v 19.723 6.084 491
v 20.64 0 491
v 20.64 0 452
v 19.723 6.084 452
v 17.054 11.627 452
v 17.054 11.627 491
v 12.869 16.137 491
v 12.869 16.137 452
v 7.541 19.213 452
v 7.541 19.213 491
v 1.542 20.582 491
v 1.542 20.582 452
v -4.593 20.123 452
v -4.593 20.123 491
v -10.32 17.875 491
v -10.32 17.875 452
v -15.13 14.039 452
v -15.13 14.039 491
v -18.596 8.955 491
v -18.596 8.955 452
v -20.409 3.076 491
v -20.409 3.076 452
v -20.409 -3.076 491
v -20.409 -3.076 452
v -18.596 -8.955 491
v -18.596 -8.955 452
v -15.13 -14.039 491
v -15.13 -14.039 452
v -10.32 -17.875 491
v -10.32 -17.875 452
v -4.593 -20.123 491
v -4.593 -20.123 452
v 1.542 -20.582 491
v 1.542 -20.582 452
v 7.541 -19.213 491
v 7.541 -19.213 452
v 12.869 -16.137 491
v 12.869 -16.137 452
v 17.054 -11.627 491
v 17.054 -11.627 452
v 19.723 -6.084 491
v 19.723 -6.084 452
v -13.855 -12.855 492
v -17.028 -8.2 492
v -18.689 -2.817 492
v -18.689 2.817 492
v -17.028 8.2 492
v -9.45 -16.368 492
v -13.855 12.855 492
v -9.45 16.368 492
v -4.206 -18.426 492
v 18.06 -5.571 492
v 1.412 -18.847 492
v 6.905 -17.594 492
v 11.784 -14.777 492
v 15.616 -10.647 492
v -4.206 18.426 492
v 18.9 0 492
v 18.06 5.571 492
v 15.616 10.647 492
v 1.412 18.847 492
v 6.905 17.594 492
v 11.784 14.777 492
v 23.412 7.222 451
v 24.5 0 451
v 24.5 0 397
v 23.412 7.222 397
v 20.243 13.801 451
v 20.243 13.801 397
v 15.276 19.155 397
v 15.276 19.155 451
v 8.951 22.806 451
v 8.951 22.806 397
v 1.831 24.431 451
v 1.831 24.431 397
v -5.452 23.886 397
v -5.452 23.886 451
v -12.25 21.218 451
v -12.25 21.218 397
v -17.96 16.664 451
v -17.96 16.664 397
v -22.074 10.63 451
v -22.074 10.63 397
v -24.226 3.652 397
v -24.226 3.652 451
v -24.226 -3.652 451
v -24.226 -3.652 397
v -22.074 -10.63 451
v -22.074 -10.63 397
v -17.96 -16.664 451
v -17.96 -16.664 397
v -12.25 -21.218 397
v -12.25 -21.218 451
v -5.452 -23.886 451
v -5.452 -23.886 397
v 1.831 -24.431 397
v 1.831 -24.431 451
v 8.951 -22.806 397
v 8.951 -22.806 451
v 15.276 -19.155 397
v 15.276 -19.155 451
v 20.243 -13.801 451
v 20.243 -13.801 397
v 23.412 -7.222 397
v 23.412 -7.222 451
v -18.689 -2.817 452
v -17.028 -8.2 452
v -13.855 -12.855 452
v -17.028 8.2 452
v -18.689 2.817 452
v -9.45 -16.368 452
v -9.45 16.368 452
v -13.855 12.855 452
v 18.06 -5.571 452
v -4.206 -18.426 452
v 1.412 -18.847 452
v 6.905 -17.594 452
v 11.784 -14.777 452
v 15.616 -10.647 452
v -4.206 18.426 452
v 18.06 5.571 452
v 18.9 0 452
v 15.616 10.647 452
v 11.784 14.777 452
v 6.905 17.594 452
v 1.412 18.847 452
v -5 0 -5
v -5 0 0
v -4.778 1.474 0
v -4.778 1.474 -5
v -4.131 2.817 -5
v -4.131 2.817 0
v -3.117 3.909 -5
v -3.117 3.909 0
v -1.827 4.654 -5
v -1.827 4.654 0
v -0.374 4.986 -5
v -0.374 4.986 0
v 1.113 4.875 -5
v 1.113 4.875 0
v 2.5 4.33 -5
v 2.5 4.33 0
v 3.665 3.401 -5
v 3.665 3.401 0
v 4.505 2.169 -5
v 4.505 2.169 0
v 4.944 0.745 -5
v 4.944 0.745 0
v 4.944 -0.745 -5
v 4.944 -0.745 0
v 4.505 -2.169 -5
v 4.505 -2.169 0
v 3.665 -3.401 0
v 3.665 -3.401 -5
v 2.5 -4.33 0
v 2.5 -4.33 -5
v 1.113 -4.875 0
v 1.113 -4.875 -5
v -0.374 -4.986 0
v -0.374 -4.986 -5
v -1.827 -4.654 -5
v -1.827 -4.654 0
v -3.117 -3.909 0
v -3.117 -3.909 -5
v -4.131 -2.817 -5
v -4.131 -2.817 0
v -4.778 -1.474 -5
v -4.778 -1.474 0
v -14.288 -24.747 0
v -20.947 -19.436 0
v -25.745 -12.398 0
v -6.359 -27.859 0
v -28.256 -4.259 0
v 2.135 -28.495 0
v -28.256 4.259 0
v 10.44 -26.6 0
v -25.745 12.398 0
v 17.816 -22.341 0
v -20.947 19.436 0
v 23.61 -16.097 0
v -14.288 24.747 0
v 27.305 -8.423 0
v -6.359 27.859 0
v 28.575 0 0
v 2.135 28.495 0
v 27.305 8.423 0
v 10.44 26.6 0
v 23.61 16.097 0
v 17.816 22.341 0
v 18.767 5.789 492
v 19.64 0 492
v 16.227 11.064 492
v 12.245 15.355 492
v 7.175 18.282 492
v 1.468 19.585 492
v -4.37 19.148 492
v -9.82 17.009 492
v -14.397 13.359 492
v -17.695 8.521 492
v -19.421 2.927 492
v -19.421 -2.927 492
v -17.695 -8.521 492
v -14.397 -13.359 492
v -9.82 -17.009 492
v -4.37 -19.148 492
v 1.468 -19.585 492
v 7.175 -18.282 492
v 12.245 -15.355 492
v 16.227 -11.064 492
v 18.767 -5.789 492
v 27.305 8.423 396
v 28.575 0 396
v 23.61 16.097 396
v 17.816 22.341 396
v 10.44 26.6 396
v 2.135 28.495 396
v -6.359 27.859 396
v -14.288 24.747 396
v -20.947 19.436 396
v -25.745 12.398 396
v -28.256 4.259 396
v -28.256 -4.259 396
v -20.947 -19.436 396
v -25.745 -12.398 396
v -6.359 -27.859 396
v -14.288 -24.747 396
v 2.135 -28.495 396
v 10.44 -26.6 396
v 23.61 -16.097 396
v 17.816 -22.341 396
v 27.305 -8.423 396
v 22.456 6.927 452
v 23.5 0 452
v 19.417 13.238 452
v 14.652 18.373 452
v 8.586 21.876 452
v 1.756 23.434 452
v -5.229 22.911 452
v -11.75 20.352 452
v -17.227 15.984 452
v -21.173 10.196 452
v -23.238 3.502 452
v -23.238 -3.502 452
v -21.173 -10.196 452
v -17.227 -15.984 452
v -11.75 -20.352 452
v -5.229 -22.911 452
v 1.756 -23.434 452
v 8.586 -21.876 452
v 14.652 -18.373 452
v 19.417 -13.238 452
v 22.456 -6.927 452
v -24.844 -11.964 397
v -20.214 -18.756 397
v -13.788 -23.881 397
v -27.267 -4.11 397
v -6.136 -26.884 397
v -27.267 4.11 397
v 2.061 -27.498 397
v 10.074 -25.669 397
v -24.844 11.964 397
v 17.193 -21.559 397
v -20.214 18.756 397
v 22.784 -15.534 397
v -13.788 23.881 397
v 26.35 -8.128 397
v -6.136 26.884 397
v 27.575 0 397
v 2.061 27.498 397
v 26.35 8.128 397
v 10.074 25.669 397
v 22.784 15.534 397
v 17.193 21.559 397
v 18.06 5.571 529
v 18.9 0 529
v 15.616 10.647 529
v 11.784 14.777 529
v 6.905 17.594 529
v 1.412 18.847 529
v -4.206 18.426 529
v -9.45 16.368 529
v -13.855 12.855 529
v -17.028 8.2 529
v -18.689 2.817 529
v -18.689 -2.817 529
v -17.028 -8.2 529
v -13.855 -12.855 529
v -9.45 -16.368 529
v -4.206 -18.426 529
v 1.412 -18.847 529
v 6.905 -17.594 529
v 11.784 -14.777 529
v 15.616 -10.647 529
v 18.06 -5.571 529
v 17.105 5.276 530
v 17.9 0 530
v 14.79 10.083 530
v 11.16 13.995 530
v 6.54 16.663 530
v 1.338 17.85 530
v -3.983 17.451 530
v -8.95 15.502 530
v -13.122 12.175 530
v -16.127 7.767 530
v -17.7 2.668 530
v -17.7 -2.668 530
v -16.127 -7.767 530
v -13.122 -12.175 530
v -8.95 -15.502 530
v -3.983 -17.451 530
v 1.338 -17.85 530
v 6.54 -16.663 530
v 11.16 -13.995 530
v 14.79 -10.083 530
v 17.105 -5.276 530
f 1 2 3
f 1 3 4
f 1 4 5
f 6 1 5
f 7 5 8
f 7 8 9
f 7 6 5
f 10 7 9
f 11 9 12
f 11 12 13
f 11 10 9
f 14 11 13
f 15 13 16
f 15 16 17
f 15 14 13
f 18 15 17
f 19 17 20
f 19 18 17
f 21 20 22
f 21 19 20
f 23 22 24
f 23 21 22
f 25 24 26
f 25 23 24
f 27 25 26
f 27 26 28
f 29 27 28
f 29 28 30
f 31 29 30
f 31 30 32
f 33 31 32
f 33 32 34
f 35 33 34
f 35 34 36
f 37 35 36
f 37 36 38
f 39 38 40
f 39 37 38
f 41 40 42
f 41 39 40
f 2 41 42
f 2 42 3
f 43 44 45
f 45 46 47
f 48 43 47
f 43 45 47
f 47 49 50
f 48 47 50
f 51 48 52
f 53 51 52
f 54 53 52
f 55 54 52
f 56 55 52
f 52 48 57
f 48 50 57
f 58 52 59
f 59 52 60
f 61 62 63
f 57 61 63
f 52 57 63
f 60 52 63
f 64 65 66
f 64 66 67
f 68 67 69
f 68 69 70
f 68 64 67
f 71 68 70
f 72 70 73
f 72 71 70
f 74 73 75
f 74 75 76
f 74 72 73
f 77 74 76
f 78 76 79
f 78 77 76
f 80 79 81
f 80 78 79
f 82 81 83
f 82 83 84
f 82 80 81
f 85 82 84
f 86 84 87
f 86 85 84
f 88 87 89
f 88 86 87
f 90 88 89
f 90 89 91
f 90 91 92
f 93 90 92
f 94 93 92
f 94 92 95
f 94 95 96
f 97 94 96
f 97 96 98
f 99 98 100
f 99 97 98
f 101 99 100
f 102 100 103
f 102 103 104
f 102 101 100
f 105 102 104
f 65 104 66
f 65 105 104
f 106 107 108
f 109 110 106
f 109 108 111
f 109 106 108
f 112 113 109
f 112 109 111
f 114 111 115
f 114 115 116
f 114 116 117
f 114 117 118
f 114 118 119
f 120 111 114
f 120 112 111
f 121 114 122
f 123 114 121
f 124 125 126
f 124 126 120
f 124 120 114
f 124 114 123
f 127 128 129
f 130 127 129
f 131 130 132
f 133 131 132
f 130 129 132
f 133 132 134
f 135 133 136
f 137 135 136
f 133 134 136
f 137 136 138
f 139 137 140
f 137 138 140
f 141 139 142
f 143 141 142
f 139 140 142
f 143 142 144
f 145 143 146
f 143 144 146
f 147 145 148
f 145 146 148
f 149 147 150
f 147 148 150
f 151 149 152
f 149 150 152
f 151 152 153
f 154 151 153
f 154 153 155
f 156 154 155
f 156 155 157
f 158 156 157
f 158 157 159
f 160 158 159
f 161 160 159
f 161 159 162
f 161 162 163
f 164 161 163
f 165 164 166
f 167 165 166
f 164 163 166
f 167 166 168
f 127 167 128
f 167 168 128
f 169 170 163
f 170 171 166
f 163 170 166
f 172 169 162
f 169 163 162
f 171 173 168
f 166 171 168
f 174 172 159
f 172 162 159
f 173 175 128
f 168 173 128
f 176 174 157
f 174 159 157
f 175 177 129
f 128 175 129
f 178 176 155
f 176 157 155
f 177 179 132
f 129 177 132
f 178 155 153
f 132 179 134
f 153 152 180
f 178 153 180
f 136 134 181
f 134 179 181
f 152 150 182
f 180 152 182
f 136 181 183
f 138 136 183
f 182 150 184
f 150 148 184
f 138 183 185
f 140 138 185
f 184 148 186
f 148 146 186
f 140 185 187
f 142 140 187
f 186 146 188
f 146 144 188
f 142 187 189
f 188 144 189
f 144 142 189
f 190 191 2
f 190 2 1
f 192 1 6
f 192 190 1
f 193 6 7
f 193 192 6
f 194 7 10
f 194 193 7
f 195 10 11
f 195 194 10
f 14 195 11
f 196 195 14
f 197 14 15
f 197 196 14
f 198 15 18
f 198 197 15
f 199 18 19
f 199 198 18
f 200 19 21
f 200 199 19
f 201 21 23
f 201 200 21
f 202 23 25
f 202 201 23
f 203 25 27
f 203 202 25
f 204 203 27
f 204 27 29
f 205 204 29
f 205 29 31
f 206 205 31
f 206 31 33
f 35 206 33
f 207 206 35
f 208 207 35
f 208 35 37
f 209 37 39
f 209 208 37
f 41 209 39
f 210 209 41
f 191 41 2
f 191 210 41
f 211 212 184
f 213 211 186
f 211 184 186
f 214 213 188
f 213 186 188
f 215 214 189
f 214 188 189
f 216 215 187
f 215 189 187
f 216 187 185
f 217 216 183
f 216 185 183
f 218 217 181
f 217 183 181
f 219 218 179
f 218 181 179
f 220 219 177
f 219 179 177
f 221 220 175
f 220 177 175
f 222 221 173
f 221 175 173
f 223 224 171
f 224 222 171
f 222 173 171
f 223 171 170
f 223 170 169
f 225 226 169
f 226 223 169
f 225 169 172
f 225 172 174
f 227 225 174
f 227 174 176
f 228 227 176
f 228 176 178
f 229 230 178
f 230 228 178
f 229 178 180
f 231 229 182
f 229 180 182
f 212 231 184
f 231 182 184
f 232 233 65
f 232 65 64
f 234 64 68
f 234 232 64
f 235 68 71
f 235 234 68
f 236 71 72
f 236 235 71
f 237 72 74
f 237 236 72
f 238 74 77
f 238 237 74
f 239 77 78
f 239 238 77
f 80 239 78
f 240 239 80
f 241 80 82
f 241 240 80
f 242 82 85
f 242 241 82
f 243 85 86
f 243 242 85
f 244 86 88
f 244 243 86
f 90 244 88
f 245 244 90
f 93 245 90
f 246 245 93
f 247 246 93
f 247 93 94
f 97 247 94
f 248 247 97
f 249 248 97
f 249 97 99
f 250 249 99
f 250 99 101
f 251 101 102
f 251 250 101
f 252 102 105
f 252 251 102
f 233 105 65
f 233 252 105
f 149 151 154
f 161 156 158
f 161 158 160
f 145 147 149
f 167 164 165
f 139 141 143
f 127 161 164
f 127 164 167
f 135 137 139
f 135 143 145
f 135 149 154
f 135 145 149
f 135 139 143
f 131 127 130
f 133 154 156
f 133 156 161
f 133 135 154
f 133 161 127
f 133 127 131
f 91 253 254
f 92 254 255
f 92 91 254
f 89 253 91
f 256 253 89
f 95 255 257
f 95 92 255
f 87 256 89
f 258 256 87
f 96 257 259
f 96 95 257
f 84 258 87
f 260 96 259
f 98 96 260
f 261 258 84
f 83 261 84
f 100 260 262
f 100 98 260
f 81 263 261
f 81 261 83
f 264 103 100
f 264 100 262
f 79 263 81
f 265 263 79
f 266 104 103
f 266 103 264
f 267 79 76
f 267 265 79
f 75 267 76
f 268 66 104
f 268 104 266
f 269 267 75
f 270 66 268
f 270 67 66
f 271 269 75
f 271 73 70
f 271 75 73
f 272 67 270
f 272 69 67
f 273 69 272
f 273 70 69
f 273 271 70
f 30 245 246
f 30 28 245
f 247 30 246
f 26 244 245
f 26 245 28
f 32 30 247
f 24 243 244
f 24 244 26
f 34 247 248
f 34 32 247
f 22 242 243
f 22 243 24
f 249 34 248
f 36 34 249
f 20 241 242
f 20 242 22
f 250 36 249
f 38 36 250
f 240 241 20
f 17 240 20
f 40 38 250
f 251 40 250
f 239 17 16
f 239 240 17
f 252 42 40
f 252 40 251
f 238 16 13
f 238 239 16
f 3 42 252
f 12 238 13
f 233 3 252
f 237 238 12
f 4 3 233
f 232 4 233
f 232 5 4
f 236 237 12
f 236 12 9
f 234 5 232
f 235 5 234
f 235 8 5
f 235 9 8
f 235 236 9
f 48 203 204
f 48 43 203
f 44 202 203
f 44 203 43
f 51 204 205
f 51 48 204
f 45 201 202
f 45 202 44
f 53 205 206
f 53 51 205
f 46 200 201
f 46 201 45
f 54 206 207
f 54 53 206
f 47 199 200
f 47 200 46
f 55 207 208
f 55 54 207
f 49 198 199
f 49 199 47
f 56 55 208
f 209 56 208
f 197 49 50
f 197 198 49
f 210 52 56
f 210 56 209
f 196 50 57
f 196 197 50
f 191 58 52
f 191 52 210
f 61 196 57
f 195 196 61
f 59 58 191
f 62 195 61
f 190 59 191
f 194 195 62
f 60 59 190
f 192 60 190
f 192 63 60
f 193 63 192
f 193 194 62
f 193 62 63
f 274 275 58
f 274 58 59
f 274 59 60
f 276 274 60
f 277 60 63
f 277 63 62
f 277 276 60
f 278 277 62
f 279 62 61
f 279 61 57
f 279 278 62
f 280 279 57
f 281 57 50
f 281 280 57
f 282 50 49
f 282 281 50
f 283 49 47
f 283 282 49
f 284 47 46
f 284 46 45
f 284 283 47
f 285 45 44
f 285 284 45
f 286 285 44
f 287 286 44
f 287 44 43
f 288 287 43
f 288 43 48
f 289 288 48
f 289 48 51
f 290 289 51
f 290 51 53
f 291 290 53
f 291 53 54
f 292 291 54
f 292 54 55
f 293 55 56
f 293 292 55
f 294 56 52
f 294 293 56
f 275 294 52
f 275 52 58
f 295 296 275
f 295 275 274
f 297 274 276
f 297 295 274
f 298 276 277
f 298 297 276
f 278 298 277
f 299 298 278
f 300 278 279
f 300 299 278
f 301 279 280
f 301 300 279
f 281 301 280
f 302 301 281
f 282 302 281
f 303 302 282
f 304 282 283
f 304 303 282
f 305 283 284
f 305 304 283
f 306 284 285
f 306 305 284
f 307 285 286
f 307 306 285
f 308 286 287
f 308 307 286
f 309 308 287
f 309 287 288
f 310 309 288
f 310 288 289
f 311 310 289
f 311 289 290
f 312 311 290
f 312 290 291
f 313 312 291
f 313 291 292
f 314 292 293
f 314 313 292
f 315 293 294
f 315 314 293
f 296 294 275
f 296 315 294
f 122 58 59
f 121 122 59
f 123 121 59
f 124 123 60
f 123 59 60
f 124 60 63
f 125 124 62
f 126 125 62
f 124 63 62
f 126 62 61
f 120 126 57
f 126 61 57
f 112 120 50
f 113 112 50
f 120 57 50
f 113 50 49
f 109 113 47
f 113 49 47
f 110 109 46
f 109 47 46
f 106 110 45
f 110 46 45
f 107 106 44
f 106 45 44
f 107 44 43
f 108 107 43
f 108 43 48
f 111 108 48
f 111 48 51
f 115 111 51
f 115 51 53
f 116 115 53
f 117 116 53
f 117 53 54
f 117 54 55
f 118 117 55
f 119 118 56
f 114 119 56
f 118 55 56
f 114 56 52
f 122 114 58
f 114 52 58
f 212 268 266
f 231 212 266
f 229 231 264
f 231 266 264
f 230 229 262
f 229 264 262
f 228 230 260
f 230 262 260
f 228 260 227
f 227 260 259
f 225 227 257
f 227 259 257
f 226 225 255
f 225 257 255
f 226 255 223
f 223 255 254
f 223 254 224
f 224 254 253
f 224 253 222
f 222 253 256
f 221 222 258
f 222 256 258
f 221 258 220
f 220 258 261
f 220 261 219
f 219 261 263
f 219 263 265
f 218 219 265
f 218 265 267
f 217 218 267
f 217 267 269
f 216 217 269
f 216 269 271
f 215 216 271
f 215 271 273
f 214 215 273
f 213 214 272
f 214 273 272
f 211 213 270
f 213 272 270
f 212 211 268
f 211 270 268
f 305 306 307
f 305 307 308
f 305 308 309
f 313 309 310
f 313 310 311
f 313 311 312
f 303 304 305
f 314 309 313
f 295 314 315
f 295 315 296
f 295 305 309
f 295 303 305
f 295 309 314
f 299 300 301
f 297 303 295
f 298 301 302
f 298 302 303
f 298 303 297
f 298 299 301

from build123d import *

# Parameters (mm, degrees)
SZKIC1_R                    = 28.575
DODANIE_WYCI_GNI_CIE1_DEPTH = 530
SZKIC2_OUTSIDE_W            = 166.376
SZKIC2_OUTSIDE_H            = 166.376
SZKIC2_OUTSIDE_R            = 18.9
WYTNIJ_WYCI_GNI_CIE1_DEPTH  = 38
SZKIC3_OUTSIDE_W            = 166.376
SZKIC3_OUTSIDE_H            = 166.376
SZKIC3_OUTSIDE_R            = 20.64
SZKIC3_OUTSIDE_R_2          = 18.9
WYTNIJ_WYCI_GNI_CIE2_DEPTH  = 40
SZKIC4_OUTSIDE_W            = 166.376
SZKIC4_OUTSIDE_H            = 166.376
SZKIC4_OUTSIDE_R            = 24.5
WYTNIJ_WYCI_GNI_CIE3_DEPTH  = 55
SZKIC5_R                    = 5
DODANIE_WYCI_GNI_CIE2_DEPTH = 5
SFAZOWANIE1_SIZE            = 1
SFAZOWANIE2_SIZE            = 1


with BuildPart() as part:
    # Szkic1 → Dodanie-wyciągnięcie1 (new body)
    with BuildSketch(Plane.XY):
        Circle(SZKIC1_R)
    extrude(amount=DODANIE_WYCI_GNI_CIE1_DEPTH)

    # Szkic2 outside → Wytnij-wyciągnięcie1 (cut)
    with BuildSketch(Plane.XY.offset(530)):
        Rectangle(SZKIC2_OUTSIDE_W, SZKIC2_OUTSIDE_H)
        Circle(SZKIC2_OUTSIDE_R, mode=Mode.SUBTRACT)
    extrude(amount=-WYTNIJ_WYCI_GNI_CIE1_DEPTH, mode=Mode.SUBTRACT)

    # Szkic3 outside → Wytnij-wyciągnięcie2 (cut)
    # profile 1 of 2: a face of its own
    with BuildSketch(Plane.XY.offset(492)):
        Rectangle(SZKIC3_OUTSIDE_W, SZKIC3_OUTSIDE_H)
        Circle(SZKIC3_OUTSIDE_R, mode=Mode.SUBTRACT)
    # profile 2 of 2: a face of its own
    with BuildSketch(Plane.XY.offset(492)):
        Circle(SZKIC3_OUTSIDE_R_2)
    extrude(amount=-WYTNIJ_WYCI_GNI_CIE2_DEPTH, mode=Mode.SUBTRACT)


with BuildPart() as wytnij_wyci_gni_cie2_piece_1:
    # of the separate pieces the step leaves, piece 1, a body of its own (wytnij_wyci_gni_cie2_pieces)
    add(part.part.solids().sort_by_distance((28.575, 0, 0))[0])

    # Szkic4 outside → Wytnij-wyciągnięcie3 (cut)
    with BuildSketch(Plane.XY.offset(452)):
        Rectangle(SZKIC4_OUTSIDE_W, SZKIC4_OUTSIDE_H)
        Circle(SZKIC4_OUTSIDE_R, mode=Mode.SUBTRACT)
    extrude(amount=-WYTNIJ_WYCI_GNI_CIE3_DEPTH, mode=Mode.SUBTRACT)

    # Szkic5 → Dodanie-wyciągnięcie2 (add)
    with BuildSketch(Plane(origin=(0, 0, 0), x_dir=(-1, 0, 0), z_dir=(0, 0, -1))):
        Circle(SZKIC5_R)
    extrude(amount=DODANIE_WYCI_GNI_CIE2_DEPTH)

    # Sfazowanie2
    sfazowanie2_edges = [wytnij_wyci_gni_cie2_piece_1.edges().sort_by_distance(p)[0] for p in [
        (-28.575, 0, 397),
        (-24.5, 0, 452),
        (-20.64, 0, 492),
    ]]
    chamfer(sfazowanie2_edges, length=SFAZOWANIE2_SIZE)


with BuildPart() as wytnij_wyci_gni_cie2_piece_2:
    # of the separate pieces the step leaves, piece 2, a body of its own (wytnij_wyci_gni_cie2_pieces)
    add(part.part.solids().sort_by_distance((18.9, 0, 530))[0])

    # Sfazowanie1
    sfazowanie1_edges = [wytnij_wyci_gni_cie2_piece_2.edges().sort_by_distance(p)[0] for p in [
        (-18.9, 0, 530),
    ]]
    chamfer(sfazowanie1_edges, length=SFAZOWANIE1_SIZE)


solid = Compound([wytnij_wyci_gni_cie2_piece_1.part, wytnij_wyci_gni_cie2_piece_2.part])
